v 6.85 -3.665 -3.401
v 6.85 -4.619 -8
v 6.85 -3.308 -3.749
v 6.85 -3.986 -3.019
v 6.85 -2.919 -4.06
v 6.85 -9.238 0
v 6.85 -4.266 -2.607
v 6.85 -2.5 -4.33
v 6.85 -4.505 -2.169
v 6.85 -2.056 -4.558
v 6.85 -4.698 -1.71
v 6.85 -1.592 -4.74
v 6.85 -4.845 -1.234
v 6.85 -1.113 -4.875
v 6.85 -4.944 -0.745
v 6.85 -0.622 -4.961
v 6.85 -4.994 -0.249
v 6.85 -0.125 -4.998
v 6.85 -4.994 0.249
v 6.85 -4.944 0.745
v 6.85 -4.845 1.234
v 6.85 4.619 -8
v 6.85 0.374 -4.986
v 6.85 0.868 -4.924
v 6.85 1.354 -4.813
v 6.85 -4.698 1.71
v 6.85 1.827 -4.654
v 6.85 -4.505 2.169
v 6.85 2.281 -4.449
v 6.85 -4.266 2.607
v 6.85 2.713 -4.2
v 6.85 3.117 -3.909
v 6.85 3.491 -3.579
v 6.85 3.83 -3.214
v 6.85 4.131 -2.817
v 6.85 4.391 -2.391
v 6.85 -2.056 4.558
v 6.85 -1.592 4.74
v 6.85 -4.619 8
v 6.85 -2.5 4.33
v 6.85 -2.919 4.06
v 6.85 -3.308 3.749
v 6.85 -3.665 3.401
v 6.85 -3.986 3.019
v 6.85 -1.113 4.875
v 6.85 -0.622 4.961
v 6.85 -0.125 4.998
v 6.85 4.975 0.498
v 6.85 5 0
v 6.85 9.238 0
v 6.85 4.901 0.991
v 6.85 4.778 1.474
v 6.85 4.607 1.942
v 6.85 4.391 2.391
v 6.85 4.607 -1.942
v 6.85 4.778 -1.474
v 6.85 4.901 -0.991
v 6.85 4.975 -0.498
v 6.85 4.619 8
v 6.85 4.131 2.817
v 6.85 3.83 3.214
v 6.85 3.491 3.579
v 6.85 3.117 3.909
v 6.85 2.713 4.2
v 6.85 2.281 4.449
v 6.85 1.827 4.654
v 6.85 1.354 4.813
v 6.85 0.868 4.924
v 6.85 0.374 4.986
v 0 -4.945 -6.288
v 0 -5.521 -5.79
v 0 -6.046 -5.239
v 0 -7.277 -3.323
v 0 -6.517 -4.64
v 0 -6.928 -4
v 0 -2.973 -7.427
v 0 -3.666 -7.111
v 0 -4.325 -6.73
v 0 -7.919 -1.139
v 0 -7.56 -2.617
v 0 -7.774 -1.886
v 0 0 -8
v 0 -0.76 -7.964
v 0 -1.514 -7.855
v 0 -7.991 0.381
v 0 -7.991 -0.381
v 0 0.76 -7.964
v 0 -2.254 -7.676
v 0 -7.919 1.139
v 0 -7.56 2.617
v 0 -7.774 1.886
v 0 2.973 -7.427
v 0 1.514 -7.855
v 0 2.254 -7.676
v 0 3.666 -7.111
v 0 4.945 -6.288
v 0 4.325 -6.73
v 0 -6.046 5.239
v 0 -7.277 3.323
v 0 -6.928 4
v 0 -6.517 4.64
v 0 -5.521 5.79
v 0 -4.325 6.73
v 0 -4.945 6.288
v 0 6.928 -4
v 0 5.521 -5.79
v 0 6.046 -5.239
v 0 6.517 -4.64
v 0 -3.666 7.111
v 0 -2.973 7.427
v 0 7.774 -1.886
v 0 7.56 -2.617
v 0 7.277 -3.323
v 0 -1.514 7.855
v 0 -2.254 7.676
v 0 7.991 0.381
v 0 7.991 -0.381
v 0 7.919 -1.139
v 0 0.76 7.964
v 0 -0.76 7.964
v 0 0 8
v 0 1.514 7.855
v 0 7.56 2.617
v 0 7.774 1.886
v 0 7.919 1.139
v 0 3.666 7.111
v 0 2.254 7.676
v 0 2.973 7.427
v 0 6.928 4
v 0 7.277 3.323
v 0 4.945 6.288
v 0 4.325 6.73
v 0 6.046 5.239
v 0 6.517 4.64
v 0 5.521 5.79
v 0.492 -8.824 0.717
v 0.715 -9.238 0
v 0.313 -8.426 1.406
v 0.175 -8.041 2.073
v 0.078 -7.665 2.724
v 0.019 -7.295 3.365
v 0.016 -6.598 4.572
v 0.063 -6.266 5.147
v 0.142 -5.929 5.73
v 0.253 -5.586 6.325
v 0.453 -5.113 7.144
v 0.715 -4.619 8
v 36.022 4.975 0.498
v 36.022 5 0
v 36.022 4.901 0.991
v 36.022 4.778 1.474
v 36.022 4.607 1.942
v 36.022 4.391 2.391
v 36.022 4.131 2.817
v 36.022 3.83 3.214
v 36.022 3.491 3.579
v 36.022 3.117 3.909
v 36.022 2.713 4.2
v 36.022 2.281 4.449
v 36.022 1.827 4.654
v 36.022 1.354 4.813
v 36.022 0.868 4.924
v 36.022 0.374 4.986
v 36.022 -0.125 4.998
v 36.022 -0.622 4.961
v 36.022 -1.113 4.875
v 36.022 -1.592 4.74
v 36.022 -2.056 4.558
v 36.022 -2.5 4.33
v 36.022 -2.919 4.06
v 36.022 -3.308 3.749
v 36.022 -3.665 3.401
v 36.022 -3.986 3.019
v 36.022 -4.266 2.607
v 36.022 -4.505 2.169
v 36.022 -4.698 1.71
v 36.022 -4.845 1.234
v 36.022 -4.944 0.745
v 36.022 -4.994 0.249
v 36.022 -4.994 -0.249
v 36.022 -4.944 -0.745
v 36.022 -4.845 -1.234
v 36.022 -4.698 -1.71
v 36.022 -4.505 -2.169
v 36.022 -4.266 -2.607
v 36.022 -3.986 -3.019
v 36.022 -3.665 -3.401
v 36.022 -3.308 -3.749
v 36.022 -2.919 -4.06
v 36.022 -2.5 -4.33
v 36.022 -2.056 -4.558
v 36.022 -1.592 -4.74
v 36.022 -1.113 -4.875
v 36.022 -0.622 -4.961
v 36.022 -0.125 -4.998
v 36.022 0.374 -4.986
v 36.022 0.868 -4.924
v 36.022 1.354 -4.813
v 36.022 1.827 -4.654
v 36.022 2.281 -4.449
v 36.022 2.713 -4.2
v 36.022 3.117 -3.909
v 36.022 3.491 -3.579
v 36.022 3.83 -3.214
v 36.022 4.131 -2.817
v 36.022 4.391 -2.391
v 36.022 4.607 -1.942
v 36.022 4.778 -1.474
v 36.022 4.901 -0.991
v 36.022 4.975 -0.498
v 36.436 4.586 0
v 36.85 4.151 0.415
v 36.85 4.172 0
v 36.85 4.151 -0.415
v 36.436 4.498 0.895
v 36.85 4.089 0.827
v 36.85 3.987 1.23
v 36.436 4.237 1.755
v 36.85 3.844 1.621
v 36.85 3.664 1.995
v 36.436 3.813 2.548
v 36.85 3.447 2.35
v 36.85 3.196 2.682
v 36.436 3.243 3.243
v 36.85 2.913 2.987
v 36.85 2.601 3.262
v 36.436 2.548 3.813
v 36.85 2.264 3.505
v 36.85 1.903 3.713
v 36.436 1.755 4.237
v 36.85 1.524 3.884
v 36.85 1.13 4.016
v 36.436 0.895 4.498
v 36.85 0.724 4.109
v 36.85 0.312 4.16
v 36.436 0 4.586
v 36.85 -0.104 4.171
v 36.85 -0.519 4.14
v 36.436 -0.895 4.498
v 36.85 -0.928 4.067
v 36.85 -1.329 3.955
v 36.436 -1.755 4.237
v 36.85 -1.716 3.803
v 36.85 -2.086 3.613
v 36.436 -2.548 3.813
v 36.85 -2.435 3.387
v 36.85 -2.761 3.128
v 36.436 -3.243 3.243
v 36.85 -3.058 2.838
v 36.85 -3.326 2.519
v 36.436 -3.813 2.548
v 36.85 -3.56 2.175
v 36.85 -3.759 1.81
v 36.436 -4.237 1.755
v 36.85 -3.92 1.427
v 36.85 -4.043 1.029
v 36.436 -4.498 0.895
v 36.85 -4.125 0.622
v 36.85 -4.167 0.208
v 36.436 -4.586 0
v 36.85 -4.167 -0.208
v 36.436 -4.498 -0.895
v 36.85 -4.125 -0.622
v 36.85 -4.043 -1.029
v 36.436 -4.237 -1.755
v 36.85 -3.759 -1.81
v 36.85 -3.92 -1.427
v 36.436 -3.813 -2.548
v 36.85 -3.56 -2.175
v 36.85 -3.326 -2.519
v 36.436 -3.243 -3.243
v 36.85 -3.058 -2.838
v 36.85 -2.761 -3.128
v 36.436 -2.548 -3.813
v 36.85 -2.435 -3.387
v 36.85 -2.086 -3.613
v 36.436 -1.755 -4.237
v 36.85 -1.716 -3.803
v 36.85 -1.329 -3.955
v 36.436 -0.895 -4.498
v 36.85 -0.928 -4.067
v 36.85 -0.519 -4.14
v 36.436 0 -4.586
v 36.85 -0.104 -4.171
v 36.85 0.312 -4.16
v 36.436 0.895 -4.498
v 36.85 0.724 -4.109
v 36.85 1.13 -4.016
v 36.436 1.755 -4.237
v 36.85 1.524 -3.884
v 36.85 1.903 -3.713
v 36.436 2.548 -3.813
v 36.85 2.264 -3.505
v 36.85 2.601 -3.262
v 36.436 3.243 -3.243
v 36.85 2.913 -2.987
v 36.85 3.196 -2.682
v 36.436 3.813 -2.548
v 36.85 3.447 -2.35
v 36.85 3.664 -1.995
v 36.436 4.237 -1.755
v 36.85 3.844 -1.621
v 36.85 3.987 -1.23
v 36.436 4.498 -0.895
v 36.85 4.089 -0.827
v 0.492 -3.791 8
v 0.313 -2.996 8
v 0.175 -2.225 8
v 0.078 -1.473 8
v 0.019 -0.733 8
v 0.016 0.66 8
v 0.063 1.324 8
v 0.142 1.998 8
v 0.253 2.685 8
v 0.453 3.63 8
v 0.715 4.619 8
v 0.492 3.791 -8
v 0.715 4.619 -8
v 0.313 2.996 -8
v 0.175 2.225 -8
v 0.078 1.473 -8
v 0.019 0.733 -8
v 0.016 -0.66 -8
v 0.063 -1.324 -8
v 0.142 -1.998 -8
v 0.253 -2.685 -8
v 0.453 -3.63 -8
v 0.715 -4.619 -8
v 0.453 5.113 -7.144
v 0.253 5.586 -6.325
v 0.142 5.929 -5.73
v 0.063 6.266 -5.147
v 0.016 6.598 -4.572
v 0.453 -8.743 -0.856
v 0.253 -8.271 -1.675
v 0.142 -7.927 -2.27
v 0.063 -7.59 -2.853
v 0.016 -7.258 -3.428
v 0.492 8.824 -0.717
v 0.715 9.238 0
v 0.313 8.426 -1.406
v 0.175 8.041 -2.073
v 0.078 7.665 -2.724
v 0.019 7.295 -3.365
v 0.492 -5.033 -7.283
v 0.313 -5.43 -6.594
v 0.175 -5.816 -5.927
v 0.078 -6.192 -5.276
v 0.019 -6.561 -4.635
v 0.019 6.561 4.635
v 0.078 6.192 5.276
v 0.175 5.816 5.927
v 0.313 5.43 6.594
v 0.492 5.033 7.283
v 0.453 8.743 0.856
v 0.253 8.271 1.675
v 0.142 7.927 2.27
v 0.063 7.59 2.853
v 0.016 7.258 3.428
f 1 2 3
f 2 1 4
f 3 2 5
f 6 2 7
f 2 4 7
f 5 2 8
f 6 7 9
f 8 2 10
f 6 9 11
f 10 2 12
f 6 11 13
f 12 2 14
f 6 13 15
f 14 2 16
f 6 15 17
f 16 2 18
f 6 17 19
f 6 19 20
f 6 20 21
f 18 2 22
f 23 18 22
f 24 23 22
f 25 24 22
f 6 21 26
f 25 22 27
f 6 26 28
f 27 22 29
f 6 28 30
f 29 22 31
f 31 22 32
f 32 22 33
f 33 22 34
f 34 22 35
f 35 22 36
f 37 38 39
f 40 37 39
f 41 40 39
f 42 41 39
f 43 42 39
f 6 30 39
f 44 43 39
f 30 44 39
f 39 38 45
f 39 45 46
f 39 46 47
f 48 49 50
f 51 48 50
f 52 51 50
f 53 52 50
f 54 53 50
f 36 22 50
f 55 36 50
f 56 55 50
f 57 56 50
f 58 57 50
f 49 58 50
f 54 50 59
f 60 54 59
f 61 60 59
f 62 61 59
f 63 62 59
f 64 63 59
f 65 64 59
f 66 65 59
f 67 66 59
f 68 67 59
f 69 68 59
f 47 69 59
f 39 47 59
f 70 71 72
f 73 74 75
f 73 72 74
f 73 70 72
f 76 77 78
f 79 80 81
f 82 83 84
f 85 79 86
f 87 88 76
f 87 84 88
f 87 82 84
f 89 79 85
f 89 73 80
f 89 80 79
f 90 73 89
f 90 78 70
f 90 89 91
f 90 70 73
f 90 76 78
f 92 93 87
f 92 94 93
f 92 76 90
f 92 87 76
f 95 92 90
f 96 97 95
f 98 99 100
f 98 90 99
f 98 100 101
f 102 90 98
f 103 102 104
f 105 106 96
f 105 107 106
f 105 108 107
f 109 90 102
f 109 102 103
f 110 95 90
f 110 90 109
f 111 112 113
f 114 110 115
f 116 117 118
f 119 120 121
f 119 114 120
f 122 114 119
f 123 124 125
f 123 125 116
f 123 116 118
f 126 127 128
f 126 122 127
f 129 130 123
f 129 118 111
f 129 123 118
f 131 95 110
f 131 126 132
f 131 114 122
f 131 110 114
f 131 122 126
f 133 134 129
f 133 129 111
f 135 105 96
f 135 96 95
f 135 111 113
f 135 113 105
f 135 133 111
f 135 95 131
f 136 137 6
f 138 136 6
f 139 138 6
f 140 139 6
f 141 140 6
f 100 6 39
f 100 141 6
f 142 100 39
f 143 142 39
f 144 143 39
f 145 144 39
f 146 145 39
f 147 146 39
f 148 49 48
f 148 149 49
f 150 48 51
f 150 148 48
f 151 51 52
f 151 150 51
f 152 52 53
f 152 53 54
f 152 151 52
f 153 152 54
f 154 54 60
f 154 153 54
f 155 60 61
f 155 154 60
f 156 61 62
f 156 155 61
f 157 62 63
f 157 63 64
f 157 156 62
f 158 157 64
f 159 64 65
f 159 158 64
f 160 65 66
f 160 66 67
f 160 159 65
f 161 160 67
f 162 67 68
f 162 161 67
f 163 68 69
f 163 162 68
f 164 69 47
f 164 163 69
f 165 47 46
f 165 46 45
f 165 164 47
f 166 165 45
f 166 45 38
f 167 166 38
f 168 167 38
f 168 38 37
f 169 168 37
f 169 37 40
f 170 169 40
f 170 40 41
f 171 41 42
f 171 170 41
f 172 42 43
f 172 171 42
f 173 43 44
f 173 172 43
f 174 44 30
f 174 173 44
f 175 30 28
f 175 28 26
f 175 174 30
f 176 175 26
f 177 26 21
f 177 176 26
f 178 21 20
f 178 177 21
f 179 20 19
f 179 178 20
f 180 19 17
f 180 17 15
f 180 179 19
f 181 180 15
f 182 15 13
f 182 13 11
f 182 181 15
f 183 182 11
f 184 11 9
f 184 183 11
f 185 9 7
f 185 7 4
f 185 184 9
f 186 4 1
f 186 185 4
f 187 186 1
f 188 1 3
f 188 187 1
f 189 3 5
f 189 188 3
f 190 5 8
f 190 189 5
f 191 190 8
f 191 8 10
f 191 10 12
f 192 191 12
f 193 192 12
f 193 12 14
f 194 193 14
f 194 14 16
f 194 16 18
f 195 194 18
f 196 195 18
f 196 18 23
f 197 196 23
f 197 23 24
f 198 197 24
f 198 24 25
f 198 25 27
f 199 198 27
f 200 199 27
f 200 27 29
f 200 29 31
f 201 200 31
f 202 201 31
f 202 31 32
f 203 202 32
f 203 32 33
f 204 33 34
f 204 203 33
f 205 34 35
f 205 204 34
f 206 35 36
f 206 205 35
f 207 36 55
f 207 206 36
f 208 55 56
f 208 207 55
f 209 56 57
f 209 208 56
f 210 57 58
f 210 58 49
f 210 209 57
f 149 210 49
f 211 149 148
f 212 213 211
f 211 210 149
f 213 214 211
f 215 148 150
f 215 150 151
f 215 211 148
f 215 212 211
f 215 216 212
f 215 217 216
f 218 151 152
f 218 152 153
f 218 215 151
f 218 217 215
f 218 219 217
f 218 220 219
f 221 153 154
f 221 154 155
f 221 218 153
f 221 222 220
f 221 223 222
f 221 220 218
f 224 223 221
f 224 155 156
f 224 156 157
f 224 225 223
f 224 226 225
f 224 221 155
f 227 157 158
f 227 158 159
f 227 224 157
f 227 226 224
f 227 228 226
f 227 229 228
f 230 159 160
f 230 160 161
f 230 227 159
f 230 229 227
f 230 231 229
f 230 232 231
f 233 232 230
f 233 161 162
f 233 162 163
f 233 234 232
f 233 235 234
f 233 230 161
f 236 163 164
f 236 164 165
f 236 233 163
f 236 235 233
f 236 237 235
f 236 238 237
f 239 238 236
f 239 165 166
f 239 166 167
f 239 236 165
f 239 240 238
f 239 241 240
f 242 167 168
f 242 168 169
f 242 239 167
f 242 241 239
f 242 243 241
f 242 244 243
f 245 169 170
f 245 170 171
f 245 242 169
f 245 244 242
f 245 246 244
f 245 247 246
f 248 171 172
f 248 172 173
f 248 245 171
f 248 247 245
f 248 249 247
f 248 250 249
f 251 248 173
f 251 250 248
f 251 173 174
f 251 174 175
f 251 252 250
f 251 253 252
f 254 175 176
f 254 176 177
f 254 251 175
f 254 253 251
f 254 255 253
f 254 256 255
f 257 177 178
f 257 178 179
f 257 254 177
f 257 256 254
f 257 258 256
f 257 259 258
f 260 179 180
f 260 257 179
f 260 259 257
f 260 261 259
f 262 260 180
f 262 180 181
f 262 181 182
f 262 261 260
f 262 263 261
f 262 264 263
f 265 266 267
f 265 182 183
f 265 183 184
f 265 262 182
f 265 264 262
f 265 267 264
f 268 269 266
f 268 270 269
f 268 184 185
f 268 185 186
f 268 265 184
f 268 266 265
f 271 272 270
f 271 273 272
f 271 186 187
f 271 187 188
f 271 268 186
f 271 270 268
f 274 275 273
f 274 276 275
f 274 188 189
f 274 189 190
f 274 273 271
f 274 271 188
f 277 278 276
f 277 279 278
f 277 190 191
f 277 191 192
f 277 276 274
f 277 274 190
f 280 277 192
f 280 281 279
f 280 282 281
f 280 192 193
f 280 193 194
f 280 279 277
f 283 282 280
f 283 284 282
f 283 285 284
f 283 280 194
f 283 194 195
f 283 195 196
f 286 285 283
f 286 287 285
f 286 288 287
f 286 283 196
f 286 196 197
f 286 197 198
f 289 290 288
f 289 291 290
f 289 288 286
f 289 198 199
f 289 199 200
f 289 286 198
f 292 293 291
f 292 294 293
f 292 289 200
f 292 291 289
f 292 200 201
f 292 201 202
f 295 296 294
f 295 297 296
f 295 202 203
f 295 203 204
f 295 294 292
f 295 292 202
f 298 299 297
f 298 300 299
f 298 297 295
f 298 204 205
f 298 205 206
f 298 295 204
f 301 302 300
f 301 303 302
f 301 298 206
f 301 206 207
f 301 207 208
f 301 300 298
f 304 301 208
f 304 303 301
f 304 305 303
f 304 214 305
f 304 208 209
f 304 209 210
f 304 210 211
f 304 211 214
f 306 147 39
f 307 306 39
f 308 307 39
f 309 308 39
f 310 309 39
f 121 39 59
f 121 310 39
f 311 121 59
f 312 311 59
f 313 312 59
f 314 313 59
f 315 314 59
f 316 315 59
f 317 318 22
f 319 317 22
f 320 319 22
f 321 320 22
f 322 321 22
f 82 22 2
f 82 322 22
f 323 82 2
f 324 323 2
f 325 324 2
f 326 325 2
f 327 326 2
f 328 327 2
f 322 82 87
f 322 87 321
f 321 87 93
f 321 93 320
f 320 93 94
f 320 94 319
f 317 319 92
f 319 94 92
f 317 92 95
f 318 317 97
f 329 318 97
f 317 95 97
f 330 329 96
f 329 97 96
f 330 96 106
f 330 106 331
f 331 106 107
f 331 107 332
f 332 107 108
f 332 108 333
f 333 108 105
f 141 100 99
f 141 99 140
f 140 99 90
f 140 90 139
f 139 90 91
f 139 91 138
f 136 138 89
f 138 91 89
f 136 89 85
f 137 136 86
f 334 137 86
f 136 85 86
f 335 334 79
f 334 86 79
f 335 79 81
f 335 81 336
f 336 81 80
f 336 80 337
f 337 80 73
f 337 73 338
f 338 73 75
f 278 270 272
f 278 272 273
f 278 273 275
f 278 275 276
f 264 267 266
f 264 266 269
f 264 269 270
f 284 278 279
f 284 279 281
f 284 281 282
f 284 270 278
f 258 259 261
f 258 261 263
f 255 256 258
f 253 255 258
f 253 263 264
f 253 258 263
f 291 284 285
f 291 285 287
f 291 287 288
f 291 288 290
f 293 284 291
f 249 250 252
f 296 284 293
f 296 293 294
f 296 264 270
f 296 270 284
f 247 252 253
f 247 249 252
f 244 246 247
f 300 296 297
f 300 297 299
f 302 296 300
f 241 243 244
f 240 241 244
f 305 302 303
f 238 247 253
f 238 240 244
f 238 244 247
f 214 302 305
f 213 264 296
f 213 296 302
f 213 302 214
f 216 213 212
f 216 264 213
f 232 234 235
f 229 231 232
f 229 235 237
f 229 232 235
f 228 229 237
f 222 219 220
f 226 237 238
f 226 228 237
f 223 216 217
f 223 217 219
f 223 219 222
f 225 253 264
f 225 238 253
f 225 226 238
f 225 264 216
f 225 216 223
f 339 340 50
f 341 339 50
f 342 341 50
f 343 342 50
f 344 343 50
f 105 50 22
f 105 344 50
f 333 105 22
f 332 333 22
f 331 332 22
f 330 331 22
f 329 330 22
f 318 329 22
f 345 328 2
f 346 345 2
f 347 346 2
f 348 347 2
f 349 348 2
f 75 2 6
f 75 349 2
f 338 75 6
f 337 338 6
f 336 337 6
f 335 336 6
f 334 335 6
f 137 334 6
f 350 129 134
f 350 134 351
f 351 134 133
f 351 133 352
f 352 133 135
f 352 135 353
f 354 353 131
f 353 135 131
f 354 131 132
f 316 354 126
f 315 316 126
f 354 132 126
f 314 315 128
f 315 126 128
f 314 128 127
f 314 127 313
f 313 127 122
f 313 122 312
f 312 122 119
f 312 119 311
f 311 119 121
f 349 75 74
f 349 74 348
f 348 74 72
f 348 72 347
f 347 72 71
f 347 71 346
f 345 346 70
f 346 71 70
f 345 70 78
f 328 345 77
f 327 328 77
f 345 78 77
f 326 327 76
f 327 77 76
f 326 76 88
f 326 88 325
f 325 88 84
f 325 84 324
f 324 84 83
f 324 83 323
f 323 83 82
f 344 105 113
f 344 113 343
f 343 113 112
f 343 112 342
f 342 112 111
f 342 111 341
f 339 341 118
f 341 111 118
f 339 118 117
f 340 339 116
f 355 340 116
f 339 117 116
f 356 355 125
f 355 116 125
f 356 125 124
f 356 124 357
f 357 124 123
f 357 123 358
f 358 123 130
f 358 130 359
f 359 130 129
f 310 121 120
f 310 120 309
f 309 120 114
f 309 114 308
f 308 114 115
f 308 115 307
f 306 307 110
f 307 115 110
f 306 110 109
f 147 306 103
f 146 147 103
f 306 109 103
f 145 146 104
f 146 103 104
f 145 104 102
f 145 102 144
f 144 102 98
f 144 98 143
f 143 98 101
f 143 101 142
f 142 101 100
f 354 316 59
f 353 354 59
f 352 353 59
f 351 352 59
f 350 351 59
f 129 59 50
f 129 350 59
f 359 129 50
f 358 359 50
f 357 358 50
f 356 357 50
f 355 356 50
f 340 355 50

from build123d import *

# Parameters (mm, degrees)
BASEHEAD_DEPTH = 6.85


# Read off the part's stored shape, not the designer's step: HeadChamfer
with BuildPart() as part:
    # Sketch1 → BaseHead (new body)
    with BuildSketch(Plane(origin=(0, 0, 0), x_dir=(0, 0, -1), z_dir=(1, 0, 0))):
        Polygon((8, 4.618802154), (8, -4.618802154), (0, -9.237604307), (-8, -4.618802154), (-8, 4.618802154), (0, 9.237604307), align=None)
    extrude(amount=BASEHEAD_DEPTH)

    # HeadChamfer outline → HeadChamfer (revolve, cut)
    with BuildSketch(Plane.YX):
        Polygon((9.237604311, 0.714531182), (8, 0), (9.237604311, 0), align=None)
    revolve(axis=Axis((0, 0, 0), (1, 0, 0)), mode=Mode.SUBTRACT)

    # HeadChamfer 2 outline → HeadChamfer 2 (revolve)
    with BuildSketch(Plane.YX):
        Polygon((5, 6.85), (5, 36.022), (4.172, 36.85), (0, 36.85), (0, 6.85), align=None)
    revolve(axis=Axis((0, 0, 0), (1, 0, 0)))


solid = part.part
